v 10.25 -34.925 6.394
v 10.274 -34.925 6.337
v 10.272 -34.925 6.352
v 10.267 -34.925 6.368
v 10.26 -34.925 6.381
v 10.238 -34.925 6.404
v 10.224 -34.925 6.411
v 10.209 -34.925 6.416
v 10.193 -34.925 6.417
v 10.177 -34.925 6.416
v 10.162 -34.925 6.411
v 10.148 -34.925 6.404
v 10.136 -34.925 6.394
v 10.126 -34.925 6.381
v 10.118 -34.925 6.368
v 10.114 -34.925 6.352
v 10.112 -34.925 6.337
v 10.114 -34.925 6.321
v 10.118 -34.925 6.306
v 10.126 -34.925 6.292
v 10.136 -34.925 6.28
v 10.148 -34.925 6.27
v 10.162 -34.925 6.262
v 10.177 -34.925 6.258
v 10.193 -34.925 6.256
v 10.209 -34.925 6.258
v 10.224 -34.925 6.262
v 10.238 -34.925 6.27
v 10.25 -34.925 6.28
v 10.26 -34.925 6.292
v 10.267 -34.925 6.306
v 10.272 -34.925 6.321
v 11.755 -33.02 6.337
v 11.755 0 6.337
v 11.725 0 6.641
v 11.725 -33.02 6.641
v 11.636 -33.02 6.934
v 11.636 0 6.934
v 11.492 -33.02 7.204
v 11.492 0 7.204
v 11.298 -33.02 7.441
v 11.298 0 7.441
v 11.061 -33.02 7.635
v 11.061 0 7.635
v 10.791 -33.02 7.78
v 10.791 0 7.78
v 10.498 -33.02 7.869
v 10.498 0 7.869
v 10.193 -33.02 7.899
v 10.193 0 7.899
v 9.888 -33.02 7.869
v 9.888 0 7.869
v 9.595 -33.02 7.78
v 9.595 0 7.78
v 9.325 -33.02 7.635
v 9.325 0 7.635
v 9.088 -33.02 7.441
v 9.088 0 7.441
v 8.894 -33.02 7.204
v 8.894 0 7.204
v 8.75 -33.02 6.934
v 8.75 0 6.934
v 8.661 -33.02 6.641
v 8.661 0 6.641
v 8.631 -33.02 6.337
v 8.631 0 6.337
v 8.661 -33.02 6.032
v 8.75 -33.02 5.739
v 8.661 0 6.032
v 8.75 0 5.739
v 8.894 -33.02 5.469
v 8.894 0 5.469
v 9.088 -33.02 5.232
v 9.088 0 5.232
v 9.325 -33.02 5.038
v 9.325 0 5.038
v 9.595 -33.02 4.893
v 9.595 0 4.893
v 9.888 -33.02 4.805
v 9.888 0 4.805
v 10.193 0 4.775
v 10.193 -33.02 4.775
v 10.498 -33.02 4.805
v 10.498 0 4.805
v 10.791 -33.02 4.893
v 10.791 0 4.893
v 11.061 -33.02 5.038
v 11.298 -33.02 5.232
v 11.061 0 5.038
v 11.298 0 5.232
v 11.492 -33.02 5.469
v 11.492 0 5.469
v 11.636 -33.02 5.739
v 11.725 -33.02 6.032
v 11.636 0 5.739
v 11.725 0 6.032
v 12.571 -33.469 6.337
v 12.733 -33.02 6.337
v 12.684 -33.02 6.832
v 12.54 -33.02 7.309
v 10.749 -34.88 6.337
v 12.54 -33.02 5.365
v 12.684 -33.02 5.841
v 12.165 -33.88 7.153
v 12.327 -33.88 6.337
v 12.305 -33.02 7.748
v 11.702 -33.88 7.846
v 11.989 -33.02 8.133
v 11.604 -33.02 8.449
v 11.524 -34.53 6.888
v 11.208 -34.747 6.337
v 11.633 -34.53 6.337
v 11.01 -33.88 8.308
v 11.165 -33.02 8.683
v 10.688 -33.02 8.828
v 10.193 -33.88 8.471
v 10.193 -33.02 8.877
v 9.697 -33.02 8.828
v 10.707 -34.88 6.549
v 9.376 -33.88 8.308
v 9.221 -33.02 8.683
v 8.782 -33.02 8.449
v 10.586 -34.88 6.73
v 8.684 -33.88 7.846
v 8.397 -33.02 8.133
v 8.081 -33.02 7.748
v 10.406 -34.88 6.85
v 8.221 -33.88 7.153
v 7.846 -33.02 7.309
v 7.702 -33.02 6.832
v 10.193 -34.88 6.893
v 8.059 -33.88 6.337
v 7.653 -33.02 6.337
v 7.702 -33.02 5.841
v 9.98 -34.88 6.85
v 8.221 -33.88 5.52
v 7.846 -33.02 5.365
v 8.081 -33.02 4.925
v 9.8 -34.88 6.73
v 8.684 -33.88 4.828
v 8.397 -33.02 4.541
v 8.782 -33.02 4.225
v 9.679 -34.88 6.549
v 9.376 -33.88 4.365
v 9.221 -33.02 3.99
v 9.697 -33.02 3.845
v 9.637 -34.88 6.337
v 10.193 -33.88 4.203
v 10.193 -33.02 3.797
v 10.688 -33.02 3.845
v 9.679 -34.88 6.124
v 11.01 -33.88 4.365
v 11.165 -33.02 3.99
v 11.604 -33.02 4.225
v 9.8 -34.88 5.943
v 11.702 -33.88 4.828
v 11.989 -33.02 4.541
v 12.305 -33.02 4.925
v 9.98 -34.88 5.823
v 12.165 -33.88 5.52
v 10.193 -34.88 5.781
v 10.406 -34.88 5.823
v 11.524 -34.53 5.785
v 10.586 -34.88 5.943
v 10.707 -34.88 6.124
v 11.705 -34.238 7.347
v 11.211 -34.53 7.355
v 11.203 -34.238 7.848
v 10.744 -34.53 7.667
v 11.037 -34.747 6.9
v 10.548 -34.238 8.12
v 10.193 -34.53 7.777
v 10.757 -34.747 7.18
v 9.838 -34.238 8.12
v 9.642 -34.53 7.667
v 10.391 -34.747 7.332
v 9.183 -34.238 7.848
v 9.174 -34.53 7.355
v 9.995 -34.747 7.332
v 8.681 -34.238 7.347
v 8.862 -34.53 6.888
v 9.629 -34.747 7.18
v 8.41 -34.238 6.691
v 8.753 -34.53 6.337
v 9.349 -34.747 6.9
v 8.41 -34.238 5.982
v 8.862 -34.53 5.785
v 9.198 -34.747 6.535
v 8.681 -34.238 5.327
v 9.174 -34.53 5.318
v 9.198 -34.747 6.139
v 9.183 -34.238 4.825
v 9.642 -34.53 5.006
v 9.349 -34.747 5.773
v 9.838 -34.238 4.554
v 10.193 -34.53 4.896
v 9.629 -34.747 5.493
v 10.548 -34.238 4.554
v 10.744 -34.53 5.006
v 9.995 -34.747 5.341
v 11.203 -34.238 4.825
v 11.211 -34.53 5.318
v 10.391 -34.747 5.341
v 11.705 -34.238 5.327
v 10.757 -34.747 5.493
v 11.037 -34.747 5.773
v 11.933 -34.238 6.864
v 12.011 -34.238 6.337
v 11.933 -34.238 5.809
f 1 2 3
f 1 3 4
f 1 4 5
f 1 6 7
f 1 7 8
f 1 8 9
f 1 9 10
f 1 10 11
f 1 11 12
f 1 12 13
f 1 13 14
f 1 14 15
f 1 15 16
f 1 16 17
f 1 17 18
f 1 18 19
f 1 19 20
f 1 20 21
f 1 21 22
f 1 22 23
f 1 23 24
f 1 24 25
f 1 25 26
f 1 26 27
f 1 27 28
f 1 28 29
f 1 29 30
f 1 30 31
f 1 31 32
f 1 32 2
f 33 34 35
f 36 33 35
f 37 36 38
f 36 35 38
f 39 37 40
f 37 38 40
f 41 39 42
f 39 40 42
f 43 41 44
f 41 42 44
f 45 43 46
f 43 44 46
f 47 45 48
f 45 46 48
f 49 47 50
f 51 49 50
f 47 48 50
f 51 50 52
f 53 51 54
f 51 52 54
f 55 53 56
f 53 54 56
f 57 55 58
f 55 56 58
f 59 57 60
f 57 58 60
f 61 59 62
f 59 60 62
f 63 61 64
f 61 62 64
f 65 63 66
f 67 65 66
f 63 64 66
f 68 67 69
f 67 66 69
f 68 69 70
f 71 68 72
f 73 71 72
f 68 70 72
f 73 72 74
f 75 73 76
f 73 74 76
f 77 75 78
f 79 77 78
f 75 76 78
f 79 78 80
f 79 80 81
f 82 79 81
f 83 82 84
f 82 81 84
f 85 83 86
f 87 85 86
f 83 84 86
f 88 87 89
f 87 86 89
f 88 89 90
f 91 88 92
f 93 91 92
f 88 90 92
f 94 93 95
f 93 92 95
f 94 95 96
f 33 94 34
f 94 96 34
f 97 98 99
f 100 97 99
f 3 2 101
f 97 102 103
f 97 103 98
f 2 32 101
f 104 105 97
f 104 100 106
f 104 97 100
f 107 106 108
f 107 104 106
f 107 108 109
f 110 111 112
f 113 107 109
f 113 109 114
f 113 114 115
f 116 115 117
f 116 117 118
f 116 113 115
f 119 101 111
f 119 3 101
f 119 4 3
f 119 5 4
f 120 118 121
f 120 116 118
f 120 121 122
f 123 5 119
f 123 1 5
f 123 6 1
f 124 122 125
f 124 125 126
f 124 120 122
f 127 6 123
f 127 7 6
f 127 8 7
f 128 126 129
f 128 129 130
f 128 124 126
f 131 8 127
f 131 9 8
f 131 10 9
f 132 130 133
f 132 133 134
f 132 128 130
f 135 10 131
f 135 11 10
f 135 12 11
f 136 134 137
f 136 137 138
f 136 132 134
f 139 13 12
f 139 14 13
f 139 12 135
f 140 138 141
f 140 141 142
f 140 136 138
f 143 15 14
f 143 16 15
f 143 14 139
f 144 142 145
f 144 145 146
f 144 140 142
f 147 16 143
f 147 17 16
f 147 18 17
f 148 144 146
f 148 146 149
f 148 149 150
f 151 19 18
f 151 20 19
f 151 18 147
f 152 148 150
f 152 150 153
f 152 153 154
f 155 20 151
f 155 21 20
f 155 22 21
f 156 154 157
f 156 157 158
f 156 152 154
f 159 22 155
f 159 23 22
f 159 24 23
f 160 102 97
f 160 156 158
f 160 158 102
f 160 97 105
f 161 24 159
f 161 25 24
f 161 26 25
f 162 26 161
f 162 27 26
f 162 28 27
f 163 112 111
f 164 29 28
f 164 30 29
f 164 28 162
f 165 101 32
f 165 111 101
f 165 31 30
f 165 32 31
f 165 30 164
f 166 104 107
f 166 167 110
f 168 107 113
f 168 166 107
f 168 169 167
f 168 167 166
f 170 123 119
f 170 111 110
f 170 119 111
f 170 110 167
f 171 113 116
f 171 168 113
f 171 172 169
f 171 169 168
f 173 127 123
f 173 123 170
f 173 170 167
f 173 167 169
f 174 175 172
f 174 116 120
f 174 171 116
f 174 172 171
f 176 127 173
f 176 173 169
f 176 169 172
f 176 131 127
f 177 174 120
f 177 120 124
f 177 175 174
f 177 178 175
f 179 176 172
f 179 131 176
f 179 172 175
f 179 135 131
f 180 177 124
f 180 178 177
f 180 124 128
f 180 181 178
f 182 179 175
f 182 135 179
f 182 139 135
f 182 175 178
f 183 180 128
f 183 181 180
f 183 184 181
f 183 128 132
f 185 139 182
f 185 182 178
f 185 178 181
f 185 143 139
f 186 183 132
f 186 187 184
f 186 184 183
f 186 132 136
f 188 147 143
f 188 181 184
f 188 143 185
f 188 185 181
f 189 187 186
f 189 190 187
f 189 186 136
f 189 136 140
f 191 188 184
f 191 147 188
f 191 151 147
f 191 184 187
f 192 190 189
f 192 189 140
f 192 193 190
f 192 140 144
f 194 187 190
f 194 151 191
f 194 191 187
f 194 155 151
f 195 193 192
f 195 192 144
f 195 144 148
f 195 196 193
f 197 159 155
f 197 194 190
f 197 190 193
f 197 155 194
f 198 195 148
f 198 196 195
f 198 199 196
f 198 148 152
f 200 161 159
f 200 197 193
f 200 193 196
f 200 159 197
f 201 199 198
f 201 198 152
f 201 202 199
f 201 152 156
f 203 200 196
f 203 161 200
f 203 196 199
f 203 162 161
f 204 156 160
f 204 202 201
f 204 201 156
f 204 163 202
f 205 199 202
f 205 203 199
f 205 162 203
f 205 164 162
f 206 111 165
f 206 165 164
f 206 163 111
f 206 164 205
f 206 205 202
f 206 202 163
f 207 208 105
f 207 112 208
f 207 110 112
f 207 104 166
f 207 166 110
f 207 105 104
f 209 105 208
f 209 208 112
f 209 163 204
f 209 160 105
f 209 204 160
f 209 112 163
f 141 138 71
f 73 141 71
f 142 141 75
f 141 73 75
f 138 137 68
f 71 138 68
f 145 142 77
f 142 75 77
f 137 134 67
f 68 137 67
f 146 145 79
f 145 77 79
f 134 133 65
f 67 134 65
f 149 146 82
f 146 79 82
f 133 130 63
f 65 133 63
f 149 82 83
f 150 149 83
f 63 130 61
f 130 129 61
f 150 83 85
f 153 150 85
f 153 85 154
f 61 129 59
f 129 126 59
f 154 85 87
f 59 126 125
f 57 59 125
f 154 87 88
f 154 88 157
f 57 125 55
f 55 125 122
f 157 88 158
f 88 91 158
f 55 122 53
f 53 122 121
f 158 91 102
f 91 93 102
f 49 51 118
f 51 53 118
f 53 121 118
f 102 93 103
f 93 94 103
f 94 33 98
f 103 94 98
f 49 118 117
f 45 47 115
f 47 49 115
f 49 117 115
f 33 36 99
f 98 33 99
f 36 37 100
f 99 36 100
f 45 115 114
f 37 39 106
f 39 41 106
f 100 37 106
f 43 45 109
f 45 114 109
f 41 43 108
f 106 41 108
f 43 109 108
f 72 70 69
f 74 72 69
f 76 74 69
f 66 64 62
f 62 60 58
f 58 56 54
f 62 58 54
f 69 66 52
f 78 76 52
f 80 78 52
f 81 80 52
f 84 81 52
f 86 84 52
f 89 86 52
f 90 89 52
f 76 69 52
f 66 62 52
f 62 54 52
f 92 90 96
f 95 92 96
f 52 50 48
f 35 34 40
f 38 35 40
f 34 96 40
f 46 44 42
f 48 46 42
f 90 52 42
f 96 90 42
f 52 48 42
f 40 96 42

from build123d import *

# Parameters (mm, degrees)
F0_R     = 1.5621
F1_DEPTH = 33.02
F2_R     = 2.54
F3_DEPTH = 1.905


# Not quite as in the source:
# - a fillet or chamfer that OpenCascade refuses, or shapes differently, is made with other operations: its cross-section is extruded or revolved along the edge and cut away or added


with BuildPart() as f1:
    # F0 (on Front) → F1 (new body)
    with BuildSketch(Plane.XZ):
        with Locations((10.1929502562, 6.33663591)):
            Circle(F0_R)
    extrude(amount=F1_DEPTH)

    # F2 (on face) → F3 (join)
    with BuildSketch(Plane.XZ.offset(33.02)):
        with Locations((10.1929502562, 6.33663591)):
            Circle(F2_R)
    extrude(amount=F3_DEPTH)

    # F4: fillet of radius 2.54 on 1 edges, made by hand

    # F4_s1 → F4_t2 (revolve, cut)
    with BuildSketch(Plane.XY.offset(6.33663591)):
        with BuildLine():
            ThreePointArc((12.7329502562, -33.02), (11.829031818, -34.3930463142), (10.2736058313, -34.925))
            Line((10.2736058313, -34.925), (12.7329502562, -34.925))
            Line((12.7329502562, -34.925), (12.7329502562, -33.02))
        make_face()
    revolve(axis=Axis((10.1929502562, -34.925, 6.33663591), (0, -1, 0)), mode=Mode.SUBTRACT)


solid = f1.part
